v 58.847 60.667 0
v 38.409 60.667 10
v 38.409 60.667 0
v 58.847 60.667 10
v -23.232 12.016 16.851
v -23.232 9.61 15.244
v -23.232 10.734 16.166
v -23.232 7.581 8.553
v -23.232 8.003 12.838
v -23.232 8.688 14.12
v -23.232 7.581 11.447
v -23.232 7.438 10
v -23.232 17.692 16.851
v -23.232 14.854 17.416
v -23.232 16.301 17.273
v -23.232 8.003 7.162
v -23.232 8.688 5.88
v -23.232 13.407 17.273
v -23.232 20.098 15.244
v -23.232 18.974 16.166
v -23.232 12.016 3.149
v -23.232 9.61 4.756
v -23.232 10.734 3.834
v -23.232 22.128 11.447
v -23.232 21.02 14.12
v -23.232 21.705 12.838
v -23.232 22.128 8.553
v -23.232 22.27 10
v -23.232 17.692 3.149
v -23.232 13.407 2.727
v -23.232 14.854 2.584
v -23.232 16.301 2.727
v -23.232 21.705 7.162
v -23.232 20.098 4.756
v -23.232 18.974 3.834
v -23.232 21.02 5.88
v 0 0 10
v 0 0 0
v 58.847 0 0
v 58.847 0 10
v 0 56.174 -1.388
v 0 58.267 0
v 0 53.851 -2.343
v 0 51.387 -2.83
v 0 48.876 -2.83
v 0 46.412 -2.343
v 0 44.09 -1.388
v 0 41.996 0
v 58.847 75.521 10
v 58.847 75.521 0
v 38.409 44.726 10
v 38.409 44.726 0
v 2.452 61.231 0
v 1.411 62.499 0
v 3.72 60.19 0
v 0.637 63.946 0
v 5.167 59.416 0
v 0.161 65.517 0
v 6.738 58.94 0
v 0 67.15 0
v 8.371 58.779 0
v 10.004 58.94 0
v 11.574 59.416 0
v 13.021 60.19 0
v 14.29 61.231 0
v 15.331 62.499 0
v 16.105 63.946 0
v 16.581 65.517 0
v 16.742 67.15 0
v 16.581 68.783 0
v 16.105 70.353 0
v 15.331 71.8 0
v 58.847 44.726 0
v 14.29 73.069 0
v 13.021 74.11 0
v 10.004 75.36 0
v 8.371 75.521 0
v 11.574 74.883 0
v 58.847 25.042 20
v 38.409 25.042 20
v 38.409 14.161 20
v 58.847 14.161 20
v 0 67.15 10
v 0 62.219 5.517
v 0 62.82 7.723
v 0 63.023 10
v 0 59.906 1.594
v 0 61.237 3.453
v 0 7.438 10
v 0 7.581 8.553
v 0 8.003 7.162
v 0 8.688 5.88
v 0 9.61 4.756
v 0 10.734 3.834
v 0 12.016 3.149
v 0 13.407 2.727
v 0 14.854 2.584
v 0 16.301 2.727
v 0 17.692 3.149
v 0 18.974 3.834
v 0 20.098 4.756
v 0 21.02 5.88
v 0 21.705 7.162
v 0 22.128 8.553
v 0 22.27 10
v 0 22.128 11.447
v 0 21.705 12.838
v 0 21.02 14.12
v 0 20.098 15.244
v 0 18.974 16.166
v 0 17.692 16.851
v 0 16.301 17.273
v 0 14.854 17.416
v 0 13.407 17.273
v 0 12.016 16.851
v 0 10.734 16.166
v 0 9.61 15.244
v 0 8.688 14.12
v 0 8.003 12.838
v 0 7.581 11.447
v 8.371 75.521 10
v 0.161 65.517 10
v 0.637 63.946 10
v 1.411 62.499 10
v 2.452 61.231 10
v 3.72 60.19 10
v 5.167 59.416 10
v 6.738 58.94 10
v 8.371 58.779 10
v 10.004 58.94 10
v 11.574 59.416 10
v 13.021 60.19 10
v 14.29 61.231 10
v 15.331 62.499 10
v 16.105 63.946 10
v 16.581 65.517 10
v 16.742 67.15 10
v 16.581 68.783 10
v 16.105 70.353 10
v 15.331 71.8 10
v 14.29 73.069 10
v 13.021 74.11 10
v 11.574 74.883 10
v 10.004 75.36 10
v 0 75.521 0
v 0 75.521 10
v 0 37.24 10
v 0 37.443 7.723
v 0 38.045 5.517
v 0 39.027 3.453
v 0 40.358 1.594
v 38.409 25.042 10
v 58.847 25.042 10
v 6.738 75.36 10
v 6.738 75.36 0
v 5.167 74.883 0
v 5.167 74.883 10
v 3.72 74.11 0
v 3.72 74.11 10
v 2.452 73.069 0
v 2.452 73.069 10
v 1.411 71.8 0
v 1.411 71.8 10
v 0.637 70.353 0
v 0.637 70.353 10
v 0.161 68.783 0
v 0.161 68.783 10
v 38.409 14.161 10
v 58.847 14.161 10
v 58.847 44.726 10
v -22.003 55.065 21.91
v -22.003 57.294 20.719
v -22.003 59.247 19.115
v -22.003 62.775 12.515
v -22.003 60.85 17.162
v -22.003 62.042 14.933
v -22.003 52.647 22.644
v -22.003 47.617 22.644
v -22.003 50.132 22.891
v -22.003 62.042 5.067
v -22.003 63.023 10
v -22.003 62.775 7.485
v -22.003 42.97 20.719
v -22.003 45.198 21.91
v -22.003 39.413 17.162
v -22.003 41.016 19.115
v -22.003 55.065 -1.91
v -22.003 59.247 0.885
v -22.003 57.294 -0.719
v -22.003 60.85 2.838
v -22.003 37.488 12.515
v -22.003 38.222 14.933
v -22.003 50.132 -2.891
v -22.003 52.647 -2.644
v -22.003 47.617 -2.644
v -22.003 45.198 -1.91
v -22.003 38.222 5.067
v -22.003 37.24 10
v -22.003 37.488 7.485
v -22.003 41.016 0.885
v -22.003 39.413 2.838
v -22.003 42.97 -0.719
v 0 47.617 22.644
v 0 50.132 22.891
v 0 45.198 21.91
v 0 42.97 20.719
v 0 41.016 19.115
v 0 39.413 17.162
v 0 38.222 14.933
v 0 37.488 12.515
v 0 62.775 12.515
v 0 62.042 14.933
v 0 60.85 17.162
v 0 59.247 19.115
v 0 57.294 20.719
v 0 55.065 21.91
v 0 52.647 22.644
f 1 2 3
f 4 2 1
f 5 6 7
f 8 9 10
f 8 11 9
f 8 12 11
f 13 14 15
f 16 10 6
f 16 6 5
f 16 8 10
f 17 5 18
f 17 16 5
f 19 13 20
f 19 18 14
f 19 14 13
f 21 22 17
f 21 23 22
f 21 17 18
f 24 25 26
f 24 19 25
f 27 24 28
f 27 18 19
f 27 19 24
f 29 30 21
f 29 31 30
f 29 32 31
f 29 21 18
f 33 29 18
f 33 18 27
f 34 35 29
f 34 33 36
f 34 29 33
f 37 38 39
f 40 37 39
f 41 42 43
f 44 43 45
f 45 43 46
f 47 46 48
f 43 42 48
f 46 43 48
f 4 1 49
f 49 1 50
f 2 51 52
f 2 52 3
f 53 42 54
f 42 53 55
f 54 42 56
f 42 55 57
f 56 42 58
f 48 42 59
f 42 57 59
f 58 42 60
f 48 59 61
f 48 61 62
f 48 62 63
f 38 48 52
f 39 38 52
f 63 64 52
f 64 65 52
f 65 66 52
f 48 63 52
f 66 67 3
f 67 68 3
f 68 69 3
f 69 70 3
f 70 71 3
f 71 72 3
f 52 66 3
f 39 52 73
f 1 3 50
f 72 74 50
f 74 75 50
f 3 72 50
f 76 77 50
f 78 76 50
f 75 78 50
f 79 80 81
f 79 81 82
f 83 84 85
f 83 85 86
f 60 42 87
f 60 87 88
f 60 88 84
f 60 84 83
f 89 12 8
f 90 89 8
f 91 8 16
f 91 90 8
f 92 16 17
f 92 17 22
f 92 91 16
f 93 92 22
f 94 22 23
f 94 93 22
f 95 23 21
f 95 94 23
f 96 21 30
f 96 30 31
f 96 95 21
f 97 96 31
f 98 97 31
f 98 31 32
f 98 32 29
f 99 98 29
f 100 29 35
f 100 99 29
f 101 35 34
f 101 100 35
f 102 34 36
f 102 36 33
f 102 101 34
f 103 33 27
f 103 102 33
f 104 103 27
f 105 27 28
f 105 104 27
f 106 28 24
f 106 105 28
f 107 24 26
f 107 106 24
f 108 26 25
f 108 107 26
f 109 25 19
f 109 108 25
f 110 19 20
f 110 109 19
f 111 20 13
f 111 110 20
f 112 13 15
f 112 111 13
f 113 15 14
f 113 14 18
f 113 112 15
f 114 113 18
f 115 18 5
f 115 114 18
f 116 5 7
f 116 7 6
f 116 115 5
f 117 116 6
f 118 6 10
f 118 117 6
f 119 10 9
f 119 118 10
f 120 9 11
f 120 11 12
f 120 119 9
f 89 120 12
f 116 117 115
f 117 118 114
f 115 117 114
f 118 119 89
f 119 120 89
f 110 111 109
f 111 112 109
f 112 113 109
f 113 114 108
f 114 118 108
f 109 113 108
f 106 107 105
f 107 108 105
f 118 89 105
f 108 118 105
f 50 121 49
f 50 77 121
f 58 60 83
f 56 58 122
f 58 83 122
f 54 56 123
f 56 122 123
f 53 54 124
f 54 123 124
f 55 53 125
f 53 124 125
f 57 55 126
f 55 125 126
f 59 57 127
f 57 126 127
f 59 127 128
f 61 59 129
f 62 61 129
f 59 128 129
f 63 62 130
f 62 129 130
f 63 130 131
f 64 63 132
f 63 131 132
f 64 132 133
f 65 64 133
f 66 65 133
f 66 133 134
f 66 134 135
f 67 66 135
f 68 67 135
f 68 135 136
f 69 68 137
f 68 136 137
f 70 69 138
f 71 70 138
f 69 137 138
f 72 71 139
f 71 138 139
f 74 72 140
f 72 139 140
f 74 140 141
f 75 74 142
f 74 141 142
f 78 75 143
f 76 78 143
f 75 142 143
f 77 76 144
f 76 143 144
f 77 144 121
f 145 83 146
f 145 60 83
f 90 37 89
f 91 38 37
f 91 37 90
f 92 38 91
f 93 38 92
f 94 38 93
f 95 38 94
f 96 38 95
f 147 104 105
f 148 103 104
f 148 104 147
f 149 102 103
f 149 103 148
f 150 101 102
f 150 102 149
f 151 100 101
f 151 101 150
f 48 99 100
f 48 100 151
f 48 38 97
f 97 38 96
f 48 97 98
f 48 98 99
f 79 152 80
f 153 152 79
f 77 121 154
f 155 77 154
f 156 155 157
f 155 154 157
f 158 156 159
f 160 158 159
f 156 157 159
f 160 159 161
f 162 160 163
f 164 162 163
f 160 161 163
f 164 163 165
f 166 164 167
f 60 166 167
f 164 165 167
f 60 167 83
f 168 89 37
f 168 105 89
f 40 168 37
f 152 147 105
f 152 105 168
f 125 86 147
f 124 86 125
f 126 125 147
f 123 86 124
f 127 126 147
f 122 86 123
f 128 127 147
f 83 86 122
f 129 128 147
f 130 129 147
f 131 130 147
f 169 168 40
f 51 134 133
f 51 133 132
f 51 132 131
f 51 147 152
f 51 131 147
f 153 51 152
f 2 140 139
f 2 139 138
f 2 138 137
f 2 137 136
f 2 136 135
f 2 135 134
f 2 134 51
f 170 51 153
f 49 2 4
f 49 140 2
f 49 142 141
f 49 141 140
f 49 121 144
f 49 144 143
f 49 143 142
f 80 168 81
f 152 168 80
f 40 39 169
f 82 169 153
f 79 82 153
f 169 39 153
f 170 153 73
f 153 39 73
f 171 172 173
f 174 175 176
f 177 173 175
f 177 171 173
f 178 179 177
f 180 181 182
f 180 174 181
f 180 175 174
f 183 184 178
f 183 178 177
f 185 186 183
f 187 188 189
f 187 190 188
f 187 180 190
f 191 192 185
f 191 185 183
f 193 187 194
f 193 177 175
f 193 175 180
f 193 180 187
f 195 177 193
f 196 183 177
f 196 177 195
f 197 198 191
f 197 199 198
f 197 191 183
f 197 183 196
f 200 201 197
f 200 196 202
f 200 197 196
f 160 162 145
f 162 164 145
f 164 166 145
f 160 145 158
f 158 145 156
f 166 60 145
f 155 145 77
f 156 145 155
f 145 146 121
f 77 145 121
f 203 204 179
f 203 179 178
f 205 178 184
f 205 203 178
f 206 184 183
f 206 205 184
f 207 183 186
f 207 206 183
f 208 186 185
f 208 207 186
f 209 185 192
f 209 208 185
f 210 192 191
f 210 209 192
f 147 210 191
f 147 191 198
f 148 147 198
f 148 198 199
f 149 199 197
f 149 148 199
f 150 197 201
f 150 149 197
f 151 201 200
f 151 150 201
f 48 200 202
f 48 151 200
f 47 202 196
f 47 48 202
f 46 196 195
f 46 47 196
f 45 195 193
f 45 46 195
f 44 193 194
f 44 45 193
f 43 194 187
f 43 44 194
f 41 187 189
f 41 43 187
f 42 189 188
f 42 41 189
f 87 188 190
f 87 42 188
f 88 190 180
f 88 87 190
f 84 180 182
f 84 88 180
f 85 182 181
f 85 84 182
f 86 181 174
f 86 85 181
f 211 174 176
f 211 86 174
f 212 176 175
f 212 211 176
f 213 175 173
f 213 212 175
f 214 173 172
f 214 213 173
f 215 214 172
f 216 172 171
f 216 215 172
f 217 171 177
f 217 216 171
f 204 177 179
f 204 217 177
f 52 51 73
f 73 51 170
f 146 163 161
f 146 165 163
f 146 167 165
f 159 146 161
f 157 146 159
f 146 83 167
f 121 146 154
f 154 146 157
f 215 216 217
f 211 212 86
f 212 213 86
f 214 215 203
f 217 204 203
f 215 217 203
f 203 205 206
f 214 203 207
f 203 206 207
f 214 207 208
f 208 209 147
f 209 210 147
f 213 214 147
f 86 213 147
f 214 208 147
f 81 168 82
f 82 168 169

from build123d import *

# Parameters (mm, degrees)
SKETCH_1_W          = 58.847230119
SKETCH_1_H          = 75.520611986
EXTRUDE_1_DEPTH     = 10
SKETCH_2_W          = 22.002810591
SKETCH_2_H          = 12.891260339
SKETCH_3_W          = 23.231808856
SKETCH_3_H          = 7.415940087
SKETCH_4_W          = 20.437933357
SKETCH_4_H          = 15.940805794
CUT_EXTRUDE_1_DEPTH = 10
SKETCH_4_3_W        = 20.437933357
SKETCH_4_3_H        = 10.881332651
EXTRUDE_2_DEPTH     = 10
SKETCH_5_R          = 8.370863313
CUT_EXTRUDE_3_DEPTH = 10


with BuildPart() as part:
    # 草图1 → 凸台-拉伸1 (new body)
    with BuildSketch(Plane.XY):
        with Locations((29.42361506, 37.760305993)):
            Rectangle(SKETCH_1_W, SKETCH_1_H)
    extrude(amount=EXTRUDE_1_DEPTH)

    # 草图2 → 旋转1 (revolve)
    with BuildSketch(Plane.XY.offset(10)):
        with Locations((-11.001405296, 56.577387616)):
            Rectangle(SKETCH_2_W, SKETCH_2_H)
    revolve(axis=Axis((-22.002810591, 50.131757446, 10), (1, 0, 0)))

    # 草图3 → 旋转2 (revolve)
    with BuildSketch(Plane.XY.offset(10)):
        with Locations((-11.615904428, 18.562031188)):
            Rectangle(SKETCH_3_W, SKETCH_3_H)
    revolve(axis=Axis((-23.231808856, 14.854061144, 10), (1, 0, 0)))

    # 草图4 → 切除-拉伸1 (cut)
    with BuildSketch(Plane.XY.offset(10)):
        with Locations((48.628263441, 52.696147944)):
            Rectangle(SKETCH_4_W, SKETCH_4_H)
    extrude(amount=-CUT_EXTRUDE_1_DEPTH, mode=Mode.SUBTRACT)

    # 草图4<3> → 凸台-拉伸2 (add)
    with BuildSketch(Plane.XY.offset(10)):
        with Locations((48.628263441, 19.601648958)):
            Rectangle(SKETCH_4_3_W, SKETCH_4_3_H)
    extrude(amount=EXTRUDE_2_DEPTH)

    # 草图5 → 切除-拉伸3 (cut)
    with BuildSketch(Plane.XY.offset(10)):
        with Locations((8.370863313, 67.149748673)):
            Circle(SKETCH_5_R)
    extrude(amount=-CUT_EXTRUDE_3_DEPTH, mode=Mode.SUBTRACT)


with BuildPart() as cut_extrude_3_piece_1:
    # of the separate pieces the step leaves, piece 1, a body of its own (cut_extrude_3_pieces)
    add(part.part.solids().sort_by_distance((0, 0, 0))[0])


with BuildPart() as cut_extrude_3_piece_2:
    # of the separate pieces the step leaves, piece 2, a body of its own (cut_extrude_3_pieces)
    add(part.part.solids().sort_by_distance((0, 75.520611986, 0))[0])


solid = Compound([cut_extrude_3_piece_1.part, cut_extrude_3_piece_2.part])
